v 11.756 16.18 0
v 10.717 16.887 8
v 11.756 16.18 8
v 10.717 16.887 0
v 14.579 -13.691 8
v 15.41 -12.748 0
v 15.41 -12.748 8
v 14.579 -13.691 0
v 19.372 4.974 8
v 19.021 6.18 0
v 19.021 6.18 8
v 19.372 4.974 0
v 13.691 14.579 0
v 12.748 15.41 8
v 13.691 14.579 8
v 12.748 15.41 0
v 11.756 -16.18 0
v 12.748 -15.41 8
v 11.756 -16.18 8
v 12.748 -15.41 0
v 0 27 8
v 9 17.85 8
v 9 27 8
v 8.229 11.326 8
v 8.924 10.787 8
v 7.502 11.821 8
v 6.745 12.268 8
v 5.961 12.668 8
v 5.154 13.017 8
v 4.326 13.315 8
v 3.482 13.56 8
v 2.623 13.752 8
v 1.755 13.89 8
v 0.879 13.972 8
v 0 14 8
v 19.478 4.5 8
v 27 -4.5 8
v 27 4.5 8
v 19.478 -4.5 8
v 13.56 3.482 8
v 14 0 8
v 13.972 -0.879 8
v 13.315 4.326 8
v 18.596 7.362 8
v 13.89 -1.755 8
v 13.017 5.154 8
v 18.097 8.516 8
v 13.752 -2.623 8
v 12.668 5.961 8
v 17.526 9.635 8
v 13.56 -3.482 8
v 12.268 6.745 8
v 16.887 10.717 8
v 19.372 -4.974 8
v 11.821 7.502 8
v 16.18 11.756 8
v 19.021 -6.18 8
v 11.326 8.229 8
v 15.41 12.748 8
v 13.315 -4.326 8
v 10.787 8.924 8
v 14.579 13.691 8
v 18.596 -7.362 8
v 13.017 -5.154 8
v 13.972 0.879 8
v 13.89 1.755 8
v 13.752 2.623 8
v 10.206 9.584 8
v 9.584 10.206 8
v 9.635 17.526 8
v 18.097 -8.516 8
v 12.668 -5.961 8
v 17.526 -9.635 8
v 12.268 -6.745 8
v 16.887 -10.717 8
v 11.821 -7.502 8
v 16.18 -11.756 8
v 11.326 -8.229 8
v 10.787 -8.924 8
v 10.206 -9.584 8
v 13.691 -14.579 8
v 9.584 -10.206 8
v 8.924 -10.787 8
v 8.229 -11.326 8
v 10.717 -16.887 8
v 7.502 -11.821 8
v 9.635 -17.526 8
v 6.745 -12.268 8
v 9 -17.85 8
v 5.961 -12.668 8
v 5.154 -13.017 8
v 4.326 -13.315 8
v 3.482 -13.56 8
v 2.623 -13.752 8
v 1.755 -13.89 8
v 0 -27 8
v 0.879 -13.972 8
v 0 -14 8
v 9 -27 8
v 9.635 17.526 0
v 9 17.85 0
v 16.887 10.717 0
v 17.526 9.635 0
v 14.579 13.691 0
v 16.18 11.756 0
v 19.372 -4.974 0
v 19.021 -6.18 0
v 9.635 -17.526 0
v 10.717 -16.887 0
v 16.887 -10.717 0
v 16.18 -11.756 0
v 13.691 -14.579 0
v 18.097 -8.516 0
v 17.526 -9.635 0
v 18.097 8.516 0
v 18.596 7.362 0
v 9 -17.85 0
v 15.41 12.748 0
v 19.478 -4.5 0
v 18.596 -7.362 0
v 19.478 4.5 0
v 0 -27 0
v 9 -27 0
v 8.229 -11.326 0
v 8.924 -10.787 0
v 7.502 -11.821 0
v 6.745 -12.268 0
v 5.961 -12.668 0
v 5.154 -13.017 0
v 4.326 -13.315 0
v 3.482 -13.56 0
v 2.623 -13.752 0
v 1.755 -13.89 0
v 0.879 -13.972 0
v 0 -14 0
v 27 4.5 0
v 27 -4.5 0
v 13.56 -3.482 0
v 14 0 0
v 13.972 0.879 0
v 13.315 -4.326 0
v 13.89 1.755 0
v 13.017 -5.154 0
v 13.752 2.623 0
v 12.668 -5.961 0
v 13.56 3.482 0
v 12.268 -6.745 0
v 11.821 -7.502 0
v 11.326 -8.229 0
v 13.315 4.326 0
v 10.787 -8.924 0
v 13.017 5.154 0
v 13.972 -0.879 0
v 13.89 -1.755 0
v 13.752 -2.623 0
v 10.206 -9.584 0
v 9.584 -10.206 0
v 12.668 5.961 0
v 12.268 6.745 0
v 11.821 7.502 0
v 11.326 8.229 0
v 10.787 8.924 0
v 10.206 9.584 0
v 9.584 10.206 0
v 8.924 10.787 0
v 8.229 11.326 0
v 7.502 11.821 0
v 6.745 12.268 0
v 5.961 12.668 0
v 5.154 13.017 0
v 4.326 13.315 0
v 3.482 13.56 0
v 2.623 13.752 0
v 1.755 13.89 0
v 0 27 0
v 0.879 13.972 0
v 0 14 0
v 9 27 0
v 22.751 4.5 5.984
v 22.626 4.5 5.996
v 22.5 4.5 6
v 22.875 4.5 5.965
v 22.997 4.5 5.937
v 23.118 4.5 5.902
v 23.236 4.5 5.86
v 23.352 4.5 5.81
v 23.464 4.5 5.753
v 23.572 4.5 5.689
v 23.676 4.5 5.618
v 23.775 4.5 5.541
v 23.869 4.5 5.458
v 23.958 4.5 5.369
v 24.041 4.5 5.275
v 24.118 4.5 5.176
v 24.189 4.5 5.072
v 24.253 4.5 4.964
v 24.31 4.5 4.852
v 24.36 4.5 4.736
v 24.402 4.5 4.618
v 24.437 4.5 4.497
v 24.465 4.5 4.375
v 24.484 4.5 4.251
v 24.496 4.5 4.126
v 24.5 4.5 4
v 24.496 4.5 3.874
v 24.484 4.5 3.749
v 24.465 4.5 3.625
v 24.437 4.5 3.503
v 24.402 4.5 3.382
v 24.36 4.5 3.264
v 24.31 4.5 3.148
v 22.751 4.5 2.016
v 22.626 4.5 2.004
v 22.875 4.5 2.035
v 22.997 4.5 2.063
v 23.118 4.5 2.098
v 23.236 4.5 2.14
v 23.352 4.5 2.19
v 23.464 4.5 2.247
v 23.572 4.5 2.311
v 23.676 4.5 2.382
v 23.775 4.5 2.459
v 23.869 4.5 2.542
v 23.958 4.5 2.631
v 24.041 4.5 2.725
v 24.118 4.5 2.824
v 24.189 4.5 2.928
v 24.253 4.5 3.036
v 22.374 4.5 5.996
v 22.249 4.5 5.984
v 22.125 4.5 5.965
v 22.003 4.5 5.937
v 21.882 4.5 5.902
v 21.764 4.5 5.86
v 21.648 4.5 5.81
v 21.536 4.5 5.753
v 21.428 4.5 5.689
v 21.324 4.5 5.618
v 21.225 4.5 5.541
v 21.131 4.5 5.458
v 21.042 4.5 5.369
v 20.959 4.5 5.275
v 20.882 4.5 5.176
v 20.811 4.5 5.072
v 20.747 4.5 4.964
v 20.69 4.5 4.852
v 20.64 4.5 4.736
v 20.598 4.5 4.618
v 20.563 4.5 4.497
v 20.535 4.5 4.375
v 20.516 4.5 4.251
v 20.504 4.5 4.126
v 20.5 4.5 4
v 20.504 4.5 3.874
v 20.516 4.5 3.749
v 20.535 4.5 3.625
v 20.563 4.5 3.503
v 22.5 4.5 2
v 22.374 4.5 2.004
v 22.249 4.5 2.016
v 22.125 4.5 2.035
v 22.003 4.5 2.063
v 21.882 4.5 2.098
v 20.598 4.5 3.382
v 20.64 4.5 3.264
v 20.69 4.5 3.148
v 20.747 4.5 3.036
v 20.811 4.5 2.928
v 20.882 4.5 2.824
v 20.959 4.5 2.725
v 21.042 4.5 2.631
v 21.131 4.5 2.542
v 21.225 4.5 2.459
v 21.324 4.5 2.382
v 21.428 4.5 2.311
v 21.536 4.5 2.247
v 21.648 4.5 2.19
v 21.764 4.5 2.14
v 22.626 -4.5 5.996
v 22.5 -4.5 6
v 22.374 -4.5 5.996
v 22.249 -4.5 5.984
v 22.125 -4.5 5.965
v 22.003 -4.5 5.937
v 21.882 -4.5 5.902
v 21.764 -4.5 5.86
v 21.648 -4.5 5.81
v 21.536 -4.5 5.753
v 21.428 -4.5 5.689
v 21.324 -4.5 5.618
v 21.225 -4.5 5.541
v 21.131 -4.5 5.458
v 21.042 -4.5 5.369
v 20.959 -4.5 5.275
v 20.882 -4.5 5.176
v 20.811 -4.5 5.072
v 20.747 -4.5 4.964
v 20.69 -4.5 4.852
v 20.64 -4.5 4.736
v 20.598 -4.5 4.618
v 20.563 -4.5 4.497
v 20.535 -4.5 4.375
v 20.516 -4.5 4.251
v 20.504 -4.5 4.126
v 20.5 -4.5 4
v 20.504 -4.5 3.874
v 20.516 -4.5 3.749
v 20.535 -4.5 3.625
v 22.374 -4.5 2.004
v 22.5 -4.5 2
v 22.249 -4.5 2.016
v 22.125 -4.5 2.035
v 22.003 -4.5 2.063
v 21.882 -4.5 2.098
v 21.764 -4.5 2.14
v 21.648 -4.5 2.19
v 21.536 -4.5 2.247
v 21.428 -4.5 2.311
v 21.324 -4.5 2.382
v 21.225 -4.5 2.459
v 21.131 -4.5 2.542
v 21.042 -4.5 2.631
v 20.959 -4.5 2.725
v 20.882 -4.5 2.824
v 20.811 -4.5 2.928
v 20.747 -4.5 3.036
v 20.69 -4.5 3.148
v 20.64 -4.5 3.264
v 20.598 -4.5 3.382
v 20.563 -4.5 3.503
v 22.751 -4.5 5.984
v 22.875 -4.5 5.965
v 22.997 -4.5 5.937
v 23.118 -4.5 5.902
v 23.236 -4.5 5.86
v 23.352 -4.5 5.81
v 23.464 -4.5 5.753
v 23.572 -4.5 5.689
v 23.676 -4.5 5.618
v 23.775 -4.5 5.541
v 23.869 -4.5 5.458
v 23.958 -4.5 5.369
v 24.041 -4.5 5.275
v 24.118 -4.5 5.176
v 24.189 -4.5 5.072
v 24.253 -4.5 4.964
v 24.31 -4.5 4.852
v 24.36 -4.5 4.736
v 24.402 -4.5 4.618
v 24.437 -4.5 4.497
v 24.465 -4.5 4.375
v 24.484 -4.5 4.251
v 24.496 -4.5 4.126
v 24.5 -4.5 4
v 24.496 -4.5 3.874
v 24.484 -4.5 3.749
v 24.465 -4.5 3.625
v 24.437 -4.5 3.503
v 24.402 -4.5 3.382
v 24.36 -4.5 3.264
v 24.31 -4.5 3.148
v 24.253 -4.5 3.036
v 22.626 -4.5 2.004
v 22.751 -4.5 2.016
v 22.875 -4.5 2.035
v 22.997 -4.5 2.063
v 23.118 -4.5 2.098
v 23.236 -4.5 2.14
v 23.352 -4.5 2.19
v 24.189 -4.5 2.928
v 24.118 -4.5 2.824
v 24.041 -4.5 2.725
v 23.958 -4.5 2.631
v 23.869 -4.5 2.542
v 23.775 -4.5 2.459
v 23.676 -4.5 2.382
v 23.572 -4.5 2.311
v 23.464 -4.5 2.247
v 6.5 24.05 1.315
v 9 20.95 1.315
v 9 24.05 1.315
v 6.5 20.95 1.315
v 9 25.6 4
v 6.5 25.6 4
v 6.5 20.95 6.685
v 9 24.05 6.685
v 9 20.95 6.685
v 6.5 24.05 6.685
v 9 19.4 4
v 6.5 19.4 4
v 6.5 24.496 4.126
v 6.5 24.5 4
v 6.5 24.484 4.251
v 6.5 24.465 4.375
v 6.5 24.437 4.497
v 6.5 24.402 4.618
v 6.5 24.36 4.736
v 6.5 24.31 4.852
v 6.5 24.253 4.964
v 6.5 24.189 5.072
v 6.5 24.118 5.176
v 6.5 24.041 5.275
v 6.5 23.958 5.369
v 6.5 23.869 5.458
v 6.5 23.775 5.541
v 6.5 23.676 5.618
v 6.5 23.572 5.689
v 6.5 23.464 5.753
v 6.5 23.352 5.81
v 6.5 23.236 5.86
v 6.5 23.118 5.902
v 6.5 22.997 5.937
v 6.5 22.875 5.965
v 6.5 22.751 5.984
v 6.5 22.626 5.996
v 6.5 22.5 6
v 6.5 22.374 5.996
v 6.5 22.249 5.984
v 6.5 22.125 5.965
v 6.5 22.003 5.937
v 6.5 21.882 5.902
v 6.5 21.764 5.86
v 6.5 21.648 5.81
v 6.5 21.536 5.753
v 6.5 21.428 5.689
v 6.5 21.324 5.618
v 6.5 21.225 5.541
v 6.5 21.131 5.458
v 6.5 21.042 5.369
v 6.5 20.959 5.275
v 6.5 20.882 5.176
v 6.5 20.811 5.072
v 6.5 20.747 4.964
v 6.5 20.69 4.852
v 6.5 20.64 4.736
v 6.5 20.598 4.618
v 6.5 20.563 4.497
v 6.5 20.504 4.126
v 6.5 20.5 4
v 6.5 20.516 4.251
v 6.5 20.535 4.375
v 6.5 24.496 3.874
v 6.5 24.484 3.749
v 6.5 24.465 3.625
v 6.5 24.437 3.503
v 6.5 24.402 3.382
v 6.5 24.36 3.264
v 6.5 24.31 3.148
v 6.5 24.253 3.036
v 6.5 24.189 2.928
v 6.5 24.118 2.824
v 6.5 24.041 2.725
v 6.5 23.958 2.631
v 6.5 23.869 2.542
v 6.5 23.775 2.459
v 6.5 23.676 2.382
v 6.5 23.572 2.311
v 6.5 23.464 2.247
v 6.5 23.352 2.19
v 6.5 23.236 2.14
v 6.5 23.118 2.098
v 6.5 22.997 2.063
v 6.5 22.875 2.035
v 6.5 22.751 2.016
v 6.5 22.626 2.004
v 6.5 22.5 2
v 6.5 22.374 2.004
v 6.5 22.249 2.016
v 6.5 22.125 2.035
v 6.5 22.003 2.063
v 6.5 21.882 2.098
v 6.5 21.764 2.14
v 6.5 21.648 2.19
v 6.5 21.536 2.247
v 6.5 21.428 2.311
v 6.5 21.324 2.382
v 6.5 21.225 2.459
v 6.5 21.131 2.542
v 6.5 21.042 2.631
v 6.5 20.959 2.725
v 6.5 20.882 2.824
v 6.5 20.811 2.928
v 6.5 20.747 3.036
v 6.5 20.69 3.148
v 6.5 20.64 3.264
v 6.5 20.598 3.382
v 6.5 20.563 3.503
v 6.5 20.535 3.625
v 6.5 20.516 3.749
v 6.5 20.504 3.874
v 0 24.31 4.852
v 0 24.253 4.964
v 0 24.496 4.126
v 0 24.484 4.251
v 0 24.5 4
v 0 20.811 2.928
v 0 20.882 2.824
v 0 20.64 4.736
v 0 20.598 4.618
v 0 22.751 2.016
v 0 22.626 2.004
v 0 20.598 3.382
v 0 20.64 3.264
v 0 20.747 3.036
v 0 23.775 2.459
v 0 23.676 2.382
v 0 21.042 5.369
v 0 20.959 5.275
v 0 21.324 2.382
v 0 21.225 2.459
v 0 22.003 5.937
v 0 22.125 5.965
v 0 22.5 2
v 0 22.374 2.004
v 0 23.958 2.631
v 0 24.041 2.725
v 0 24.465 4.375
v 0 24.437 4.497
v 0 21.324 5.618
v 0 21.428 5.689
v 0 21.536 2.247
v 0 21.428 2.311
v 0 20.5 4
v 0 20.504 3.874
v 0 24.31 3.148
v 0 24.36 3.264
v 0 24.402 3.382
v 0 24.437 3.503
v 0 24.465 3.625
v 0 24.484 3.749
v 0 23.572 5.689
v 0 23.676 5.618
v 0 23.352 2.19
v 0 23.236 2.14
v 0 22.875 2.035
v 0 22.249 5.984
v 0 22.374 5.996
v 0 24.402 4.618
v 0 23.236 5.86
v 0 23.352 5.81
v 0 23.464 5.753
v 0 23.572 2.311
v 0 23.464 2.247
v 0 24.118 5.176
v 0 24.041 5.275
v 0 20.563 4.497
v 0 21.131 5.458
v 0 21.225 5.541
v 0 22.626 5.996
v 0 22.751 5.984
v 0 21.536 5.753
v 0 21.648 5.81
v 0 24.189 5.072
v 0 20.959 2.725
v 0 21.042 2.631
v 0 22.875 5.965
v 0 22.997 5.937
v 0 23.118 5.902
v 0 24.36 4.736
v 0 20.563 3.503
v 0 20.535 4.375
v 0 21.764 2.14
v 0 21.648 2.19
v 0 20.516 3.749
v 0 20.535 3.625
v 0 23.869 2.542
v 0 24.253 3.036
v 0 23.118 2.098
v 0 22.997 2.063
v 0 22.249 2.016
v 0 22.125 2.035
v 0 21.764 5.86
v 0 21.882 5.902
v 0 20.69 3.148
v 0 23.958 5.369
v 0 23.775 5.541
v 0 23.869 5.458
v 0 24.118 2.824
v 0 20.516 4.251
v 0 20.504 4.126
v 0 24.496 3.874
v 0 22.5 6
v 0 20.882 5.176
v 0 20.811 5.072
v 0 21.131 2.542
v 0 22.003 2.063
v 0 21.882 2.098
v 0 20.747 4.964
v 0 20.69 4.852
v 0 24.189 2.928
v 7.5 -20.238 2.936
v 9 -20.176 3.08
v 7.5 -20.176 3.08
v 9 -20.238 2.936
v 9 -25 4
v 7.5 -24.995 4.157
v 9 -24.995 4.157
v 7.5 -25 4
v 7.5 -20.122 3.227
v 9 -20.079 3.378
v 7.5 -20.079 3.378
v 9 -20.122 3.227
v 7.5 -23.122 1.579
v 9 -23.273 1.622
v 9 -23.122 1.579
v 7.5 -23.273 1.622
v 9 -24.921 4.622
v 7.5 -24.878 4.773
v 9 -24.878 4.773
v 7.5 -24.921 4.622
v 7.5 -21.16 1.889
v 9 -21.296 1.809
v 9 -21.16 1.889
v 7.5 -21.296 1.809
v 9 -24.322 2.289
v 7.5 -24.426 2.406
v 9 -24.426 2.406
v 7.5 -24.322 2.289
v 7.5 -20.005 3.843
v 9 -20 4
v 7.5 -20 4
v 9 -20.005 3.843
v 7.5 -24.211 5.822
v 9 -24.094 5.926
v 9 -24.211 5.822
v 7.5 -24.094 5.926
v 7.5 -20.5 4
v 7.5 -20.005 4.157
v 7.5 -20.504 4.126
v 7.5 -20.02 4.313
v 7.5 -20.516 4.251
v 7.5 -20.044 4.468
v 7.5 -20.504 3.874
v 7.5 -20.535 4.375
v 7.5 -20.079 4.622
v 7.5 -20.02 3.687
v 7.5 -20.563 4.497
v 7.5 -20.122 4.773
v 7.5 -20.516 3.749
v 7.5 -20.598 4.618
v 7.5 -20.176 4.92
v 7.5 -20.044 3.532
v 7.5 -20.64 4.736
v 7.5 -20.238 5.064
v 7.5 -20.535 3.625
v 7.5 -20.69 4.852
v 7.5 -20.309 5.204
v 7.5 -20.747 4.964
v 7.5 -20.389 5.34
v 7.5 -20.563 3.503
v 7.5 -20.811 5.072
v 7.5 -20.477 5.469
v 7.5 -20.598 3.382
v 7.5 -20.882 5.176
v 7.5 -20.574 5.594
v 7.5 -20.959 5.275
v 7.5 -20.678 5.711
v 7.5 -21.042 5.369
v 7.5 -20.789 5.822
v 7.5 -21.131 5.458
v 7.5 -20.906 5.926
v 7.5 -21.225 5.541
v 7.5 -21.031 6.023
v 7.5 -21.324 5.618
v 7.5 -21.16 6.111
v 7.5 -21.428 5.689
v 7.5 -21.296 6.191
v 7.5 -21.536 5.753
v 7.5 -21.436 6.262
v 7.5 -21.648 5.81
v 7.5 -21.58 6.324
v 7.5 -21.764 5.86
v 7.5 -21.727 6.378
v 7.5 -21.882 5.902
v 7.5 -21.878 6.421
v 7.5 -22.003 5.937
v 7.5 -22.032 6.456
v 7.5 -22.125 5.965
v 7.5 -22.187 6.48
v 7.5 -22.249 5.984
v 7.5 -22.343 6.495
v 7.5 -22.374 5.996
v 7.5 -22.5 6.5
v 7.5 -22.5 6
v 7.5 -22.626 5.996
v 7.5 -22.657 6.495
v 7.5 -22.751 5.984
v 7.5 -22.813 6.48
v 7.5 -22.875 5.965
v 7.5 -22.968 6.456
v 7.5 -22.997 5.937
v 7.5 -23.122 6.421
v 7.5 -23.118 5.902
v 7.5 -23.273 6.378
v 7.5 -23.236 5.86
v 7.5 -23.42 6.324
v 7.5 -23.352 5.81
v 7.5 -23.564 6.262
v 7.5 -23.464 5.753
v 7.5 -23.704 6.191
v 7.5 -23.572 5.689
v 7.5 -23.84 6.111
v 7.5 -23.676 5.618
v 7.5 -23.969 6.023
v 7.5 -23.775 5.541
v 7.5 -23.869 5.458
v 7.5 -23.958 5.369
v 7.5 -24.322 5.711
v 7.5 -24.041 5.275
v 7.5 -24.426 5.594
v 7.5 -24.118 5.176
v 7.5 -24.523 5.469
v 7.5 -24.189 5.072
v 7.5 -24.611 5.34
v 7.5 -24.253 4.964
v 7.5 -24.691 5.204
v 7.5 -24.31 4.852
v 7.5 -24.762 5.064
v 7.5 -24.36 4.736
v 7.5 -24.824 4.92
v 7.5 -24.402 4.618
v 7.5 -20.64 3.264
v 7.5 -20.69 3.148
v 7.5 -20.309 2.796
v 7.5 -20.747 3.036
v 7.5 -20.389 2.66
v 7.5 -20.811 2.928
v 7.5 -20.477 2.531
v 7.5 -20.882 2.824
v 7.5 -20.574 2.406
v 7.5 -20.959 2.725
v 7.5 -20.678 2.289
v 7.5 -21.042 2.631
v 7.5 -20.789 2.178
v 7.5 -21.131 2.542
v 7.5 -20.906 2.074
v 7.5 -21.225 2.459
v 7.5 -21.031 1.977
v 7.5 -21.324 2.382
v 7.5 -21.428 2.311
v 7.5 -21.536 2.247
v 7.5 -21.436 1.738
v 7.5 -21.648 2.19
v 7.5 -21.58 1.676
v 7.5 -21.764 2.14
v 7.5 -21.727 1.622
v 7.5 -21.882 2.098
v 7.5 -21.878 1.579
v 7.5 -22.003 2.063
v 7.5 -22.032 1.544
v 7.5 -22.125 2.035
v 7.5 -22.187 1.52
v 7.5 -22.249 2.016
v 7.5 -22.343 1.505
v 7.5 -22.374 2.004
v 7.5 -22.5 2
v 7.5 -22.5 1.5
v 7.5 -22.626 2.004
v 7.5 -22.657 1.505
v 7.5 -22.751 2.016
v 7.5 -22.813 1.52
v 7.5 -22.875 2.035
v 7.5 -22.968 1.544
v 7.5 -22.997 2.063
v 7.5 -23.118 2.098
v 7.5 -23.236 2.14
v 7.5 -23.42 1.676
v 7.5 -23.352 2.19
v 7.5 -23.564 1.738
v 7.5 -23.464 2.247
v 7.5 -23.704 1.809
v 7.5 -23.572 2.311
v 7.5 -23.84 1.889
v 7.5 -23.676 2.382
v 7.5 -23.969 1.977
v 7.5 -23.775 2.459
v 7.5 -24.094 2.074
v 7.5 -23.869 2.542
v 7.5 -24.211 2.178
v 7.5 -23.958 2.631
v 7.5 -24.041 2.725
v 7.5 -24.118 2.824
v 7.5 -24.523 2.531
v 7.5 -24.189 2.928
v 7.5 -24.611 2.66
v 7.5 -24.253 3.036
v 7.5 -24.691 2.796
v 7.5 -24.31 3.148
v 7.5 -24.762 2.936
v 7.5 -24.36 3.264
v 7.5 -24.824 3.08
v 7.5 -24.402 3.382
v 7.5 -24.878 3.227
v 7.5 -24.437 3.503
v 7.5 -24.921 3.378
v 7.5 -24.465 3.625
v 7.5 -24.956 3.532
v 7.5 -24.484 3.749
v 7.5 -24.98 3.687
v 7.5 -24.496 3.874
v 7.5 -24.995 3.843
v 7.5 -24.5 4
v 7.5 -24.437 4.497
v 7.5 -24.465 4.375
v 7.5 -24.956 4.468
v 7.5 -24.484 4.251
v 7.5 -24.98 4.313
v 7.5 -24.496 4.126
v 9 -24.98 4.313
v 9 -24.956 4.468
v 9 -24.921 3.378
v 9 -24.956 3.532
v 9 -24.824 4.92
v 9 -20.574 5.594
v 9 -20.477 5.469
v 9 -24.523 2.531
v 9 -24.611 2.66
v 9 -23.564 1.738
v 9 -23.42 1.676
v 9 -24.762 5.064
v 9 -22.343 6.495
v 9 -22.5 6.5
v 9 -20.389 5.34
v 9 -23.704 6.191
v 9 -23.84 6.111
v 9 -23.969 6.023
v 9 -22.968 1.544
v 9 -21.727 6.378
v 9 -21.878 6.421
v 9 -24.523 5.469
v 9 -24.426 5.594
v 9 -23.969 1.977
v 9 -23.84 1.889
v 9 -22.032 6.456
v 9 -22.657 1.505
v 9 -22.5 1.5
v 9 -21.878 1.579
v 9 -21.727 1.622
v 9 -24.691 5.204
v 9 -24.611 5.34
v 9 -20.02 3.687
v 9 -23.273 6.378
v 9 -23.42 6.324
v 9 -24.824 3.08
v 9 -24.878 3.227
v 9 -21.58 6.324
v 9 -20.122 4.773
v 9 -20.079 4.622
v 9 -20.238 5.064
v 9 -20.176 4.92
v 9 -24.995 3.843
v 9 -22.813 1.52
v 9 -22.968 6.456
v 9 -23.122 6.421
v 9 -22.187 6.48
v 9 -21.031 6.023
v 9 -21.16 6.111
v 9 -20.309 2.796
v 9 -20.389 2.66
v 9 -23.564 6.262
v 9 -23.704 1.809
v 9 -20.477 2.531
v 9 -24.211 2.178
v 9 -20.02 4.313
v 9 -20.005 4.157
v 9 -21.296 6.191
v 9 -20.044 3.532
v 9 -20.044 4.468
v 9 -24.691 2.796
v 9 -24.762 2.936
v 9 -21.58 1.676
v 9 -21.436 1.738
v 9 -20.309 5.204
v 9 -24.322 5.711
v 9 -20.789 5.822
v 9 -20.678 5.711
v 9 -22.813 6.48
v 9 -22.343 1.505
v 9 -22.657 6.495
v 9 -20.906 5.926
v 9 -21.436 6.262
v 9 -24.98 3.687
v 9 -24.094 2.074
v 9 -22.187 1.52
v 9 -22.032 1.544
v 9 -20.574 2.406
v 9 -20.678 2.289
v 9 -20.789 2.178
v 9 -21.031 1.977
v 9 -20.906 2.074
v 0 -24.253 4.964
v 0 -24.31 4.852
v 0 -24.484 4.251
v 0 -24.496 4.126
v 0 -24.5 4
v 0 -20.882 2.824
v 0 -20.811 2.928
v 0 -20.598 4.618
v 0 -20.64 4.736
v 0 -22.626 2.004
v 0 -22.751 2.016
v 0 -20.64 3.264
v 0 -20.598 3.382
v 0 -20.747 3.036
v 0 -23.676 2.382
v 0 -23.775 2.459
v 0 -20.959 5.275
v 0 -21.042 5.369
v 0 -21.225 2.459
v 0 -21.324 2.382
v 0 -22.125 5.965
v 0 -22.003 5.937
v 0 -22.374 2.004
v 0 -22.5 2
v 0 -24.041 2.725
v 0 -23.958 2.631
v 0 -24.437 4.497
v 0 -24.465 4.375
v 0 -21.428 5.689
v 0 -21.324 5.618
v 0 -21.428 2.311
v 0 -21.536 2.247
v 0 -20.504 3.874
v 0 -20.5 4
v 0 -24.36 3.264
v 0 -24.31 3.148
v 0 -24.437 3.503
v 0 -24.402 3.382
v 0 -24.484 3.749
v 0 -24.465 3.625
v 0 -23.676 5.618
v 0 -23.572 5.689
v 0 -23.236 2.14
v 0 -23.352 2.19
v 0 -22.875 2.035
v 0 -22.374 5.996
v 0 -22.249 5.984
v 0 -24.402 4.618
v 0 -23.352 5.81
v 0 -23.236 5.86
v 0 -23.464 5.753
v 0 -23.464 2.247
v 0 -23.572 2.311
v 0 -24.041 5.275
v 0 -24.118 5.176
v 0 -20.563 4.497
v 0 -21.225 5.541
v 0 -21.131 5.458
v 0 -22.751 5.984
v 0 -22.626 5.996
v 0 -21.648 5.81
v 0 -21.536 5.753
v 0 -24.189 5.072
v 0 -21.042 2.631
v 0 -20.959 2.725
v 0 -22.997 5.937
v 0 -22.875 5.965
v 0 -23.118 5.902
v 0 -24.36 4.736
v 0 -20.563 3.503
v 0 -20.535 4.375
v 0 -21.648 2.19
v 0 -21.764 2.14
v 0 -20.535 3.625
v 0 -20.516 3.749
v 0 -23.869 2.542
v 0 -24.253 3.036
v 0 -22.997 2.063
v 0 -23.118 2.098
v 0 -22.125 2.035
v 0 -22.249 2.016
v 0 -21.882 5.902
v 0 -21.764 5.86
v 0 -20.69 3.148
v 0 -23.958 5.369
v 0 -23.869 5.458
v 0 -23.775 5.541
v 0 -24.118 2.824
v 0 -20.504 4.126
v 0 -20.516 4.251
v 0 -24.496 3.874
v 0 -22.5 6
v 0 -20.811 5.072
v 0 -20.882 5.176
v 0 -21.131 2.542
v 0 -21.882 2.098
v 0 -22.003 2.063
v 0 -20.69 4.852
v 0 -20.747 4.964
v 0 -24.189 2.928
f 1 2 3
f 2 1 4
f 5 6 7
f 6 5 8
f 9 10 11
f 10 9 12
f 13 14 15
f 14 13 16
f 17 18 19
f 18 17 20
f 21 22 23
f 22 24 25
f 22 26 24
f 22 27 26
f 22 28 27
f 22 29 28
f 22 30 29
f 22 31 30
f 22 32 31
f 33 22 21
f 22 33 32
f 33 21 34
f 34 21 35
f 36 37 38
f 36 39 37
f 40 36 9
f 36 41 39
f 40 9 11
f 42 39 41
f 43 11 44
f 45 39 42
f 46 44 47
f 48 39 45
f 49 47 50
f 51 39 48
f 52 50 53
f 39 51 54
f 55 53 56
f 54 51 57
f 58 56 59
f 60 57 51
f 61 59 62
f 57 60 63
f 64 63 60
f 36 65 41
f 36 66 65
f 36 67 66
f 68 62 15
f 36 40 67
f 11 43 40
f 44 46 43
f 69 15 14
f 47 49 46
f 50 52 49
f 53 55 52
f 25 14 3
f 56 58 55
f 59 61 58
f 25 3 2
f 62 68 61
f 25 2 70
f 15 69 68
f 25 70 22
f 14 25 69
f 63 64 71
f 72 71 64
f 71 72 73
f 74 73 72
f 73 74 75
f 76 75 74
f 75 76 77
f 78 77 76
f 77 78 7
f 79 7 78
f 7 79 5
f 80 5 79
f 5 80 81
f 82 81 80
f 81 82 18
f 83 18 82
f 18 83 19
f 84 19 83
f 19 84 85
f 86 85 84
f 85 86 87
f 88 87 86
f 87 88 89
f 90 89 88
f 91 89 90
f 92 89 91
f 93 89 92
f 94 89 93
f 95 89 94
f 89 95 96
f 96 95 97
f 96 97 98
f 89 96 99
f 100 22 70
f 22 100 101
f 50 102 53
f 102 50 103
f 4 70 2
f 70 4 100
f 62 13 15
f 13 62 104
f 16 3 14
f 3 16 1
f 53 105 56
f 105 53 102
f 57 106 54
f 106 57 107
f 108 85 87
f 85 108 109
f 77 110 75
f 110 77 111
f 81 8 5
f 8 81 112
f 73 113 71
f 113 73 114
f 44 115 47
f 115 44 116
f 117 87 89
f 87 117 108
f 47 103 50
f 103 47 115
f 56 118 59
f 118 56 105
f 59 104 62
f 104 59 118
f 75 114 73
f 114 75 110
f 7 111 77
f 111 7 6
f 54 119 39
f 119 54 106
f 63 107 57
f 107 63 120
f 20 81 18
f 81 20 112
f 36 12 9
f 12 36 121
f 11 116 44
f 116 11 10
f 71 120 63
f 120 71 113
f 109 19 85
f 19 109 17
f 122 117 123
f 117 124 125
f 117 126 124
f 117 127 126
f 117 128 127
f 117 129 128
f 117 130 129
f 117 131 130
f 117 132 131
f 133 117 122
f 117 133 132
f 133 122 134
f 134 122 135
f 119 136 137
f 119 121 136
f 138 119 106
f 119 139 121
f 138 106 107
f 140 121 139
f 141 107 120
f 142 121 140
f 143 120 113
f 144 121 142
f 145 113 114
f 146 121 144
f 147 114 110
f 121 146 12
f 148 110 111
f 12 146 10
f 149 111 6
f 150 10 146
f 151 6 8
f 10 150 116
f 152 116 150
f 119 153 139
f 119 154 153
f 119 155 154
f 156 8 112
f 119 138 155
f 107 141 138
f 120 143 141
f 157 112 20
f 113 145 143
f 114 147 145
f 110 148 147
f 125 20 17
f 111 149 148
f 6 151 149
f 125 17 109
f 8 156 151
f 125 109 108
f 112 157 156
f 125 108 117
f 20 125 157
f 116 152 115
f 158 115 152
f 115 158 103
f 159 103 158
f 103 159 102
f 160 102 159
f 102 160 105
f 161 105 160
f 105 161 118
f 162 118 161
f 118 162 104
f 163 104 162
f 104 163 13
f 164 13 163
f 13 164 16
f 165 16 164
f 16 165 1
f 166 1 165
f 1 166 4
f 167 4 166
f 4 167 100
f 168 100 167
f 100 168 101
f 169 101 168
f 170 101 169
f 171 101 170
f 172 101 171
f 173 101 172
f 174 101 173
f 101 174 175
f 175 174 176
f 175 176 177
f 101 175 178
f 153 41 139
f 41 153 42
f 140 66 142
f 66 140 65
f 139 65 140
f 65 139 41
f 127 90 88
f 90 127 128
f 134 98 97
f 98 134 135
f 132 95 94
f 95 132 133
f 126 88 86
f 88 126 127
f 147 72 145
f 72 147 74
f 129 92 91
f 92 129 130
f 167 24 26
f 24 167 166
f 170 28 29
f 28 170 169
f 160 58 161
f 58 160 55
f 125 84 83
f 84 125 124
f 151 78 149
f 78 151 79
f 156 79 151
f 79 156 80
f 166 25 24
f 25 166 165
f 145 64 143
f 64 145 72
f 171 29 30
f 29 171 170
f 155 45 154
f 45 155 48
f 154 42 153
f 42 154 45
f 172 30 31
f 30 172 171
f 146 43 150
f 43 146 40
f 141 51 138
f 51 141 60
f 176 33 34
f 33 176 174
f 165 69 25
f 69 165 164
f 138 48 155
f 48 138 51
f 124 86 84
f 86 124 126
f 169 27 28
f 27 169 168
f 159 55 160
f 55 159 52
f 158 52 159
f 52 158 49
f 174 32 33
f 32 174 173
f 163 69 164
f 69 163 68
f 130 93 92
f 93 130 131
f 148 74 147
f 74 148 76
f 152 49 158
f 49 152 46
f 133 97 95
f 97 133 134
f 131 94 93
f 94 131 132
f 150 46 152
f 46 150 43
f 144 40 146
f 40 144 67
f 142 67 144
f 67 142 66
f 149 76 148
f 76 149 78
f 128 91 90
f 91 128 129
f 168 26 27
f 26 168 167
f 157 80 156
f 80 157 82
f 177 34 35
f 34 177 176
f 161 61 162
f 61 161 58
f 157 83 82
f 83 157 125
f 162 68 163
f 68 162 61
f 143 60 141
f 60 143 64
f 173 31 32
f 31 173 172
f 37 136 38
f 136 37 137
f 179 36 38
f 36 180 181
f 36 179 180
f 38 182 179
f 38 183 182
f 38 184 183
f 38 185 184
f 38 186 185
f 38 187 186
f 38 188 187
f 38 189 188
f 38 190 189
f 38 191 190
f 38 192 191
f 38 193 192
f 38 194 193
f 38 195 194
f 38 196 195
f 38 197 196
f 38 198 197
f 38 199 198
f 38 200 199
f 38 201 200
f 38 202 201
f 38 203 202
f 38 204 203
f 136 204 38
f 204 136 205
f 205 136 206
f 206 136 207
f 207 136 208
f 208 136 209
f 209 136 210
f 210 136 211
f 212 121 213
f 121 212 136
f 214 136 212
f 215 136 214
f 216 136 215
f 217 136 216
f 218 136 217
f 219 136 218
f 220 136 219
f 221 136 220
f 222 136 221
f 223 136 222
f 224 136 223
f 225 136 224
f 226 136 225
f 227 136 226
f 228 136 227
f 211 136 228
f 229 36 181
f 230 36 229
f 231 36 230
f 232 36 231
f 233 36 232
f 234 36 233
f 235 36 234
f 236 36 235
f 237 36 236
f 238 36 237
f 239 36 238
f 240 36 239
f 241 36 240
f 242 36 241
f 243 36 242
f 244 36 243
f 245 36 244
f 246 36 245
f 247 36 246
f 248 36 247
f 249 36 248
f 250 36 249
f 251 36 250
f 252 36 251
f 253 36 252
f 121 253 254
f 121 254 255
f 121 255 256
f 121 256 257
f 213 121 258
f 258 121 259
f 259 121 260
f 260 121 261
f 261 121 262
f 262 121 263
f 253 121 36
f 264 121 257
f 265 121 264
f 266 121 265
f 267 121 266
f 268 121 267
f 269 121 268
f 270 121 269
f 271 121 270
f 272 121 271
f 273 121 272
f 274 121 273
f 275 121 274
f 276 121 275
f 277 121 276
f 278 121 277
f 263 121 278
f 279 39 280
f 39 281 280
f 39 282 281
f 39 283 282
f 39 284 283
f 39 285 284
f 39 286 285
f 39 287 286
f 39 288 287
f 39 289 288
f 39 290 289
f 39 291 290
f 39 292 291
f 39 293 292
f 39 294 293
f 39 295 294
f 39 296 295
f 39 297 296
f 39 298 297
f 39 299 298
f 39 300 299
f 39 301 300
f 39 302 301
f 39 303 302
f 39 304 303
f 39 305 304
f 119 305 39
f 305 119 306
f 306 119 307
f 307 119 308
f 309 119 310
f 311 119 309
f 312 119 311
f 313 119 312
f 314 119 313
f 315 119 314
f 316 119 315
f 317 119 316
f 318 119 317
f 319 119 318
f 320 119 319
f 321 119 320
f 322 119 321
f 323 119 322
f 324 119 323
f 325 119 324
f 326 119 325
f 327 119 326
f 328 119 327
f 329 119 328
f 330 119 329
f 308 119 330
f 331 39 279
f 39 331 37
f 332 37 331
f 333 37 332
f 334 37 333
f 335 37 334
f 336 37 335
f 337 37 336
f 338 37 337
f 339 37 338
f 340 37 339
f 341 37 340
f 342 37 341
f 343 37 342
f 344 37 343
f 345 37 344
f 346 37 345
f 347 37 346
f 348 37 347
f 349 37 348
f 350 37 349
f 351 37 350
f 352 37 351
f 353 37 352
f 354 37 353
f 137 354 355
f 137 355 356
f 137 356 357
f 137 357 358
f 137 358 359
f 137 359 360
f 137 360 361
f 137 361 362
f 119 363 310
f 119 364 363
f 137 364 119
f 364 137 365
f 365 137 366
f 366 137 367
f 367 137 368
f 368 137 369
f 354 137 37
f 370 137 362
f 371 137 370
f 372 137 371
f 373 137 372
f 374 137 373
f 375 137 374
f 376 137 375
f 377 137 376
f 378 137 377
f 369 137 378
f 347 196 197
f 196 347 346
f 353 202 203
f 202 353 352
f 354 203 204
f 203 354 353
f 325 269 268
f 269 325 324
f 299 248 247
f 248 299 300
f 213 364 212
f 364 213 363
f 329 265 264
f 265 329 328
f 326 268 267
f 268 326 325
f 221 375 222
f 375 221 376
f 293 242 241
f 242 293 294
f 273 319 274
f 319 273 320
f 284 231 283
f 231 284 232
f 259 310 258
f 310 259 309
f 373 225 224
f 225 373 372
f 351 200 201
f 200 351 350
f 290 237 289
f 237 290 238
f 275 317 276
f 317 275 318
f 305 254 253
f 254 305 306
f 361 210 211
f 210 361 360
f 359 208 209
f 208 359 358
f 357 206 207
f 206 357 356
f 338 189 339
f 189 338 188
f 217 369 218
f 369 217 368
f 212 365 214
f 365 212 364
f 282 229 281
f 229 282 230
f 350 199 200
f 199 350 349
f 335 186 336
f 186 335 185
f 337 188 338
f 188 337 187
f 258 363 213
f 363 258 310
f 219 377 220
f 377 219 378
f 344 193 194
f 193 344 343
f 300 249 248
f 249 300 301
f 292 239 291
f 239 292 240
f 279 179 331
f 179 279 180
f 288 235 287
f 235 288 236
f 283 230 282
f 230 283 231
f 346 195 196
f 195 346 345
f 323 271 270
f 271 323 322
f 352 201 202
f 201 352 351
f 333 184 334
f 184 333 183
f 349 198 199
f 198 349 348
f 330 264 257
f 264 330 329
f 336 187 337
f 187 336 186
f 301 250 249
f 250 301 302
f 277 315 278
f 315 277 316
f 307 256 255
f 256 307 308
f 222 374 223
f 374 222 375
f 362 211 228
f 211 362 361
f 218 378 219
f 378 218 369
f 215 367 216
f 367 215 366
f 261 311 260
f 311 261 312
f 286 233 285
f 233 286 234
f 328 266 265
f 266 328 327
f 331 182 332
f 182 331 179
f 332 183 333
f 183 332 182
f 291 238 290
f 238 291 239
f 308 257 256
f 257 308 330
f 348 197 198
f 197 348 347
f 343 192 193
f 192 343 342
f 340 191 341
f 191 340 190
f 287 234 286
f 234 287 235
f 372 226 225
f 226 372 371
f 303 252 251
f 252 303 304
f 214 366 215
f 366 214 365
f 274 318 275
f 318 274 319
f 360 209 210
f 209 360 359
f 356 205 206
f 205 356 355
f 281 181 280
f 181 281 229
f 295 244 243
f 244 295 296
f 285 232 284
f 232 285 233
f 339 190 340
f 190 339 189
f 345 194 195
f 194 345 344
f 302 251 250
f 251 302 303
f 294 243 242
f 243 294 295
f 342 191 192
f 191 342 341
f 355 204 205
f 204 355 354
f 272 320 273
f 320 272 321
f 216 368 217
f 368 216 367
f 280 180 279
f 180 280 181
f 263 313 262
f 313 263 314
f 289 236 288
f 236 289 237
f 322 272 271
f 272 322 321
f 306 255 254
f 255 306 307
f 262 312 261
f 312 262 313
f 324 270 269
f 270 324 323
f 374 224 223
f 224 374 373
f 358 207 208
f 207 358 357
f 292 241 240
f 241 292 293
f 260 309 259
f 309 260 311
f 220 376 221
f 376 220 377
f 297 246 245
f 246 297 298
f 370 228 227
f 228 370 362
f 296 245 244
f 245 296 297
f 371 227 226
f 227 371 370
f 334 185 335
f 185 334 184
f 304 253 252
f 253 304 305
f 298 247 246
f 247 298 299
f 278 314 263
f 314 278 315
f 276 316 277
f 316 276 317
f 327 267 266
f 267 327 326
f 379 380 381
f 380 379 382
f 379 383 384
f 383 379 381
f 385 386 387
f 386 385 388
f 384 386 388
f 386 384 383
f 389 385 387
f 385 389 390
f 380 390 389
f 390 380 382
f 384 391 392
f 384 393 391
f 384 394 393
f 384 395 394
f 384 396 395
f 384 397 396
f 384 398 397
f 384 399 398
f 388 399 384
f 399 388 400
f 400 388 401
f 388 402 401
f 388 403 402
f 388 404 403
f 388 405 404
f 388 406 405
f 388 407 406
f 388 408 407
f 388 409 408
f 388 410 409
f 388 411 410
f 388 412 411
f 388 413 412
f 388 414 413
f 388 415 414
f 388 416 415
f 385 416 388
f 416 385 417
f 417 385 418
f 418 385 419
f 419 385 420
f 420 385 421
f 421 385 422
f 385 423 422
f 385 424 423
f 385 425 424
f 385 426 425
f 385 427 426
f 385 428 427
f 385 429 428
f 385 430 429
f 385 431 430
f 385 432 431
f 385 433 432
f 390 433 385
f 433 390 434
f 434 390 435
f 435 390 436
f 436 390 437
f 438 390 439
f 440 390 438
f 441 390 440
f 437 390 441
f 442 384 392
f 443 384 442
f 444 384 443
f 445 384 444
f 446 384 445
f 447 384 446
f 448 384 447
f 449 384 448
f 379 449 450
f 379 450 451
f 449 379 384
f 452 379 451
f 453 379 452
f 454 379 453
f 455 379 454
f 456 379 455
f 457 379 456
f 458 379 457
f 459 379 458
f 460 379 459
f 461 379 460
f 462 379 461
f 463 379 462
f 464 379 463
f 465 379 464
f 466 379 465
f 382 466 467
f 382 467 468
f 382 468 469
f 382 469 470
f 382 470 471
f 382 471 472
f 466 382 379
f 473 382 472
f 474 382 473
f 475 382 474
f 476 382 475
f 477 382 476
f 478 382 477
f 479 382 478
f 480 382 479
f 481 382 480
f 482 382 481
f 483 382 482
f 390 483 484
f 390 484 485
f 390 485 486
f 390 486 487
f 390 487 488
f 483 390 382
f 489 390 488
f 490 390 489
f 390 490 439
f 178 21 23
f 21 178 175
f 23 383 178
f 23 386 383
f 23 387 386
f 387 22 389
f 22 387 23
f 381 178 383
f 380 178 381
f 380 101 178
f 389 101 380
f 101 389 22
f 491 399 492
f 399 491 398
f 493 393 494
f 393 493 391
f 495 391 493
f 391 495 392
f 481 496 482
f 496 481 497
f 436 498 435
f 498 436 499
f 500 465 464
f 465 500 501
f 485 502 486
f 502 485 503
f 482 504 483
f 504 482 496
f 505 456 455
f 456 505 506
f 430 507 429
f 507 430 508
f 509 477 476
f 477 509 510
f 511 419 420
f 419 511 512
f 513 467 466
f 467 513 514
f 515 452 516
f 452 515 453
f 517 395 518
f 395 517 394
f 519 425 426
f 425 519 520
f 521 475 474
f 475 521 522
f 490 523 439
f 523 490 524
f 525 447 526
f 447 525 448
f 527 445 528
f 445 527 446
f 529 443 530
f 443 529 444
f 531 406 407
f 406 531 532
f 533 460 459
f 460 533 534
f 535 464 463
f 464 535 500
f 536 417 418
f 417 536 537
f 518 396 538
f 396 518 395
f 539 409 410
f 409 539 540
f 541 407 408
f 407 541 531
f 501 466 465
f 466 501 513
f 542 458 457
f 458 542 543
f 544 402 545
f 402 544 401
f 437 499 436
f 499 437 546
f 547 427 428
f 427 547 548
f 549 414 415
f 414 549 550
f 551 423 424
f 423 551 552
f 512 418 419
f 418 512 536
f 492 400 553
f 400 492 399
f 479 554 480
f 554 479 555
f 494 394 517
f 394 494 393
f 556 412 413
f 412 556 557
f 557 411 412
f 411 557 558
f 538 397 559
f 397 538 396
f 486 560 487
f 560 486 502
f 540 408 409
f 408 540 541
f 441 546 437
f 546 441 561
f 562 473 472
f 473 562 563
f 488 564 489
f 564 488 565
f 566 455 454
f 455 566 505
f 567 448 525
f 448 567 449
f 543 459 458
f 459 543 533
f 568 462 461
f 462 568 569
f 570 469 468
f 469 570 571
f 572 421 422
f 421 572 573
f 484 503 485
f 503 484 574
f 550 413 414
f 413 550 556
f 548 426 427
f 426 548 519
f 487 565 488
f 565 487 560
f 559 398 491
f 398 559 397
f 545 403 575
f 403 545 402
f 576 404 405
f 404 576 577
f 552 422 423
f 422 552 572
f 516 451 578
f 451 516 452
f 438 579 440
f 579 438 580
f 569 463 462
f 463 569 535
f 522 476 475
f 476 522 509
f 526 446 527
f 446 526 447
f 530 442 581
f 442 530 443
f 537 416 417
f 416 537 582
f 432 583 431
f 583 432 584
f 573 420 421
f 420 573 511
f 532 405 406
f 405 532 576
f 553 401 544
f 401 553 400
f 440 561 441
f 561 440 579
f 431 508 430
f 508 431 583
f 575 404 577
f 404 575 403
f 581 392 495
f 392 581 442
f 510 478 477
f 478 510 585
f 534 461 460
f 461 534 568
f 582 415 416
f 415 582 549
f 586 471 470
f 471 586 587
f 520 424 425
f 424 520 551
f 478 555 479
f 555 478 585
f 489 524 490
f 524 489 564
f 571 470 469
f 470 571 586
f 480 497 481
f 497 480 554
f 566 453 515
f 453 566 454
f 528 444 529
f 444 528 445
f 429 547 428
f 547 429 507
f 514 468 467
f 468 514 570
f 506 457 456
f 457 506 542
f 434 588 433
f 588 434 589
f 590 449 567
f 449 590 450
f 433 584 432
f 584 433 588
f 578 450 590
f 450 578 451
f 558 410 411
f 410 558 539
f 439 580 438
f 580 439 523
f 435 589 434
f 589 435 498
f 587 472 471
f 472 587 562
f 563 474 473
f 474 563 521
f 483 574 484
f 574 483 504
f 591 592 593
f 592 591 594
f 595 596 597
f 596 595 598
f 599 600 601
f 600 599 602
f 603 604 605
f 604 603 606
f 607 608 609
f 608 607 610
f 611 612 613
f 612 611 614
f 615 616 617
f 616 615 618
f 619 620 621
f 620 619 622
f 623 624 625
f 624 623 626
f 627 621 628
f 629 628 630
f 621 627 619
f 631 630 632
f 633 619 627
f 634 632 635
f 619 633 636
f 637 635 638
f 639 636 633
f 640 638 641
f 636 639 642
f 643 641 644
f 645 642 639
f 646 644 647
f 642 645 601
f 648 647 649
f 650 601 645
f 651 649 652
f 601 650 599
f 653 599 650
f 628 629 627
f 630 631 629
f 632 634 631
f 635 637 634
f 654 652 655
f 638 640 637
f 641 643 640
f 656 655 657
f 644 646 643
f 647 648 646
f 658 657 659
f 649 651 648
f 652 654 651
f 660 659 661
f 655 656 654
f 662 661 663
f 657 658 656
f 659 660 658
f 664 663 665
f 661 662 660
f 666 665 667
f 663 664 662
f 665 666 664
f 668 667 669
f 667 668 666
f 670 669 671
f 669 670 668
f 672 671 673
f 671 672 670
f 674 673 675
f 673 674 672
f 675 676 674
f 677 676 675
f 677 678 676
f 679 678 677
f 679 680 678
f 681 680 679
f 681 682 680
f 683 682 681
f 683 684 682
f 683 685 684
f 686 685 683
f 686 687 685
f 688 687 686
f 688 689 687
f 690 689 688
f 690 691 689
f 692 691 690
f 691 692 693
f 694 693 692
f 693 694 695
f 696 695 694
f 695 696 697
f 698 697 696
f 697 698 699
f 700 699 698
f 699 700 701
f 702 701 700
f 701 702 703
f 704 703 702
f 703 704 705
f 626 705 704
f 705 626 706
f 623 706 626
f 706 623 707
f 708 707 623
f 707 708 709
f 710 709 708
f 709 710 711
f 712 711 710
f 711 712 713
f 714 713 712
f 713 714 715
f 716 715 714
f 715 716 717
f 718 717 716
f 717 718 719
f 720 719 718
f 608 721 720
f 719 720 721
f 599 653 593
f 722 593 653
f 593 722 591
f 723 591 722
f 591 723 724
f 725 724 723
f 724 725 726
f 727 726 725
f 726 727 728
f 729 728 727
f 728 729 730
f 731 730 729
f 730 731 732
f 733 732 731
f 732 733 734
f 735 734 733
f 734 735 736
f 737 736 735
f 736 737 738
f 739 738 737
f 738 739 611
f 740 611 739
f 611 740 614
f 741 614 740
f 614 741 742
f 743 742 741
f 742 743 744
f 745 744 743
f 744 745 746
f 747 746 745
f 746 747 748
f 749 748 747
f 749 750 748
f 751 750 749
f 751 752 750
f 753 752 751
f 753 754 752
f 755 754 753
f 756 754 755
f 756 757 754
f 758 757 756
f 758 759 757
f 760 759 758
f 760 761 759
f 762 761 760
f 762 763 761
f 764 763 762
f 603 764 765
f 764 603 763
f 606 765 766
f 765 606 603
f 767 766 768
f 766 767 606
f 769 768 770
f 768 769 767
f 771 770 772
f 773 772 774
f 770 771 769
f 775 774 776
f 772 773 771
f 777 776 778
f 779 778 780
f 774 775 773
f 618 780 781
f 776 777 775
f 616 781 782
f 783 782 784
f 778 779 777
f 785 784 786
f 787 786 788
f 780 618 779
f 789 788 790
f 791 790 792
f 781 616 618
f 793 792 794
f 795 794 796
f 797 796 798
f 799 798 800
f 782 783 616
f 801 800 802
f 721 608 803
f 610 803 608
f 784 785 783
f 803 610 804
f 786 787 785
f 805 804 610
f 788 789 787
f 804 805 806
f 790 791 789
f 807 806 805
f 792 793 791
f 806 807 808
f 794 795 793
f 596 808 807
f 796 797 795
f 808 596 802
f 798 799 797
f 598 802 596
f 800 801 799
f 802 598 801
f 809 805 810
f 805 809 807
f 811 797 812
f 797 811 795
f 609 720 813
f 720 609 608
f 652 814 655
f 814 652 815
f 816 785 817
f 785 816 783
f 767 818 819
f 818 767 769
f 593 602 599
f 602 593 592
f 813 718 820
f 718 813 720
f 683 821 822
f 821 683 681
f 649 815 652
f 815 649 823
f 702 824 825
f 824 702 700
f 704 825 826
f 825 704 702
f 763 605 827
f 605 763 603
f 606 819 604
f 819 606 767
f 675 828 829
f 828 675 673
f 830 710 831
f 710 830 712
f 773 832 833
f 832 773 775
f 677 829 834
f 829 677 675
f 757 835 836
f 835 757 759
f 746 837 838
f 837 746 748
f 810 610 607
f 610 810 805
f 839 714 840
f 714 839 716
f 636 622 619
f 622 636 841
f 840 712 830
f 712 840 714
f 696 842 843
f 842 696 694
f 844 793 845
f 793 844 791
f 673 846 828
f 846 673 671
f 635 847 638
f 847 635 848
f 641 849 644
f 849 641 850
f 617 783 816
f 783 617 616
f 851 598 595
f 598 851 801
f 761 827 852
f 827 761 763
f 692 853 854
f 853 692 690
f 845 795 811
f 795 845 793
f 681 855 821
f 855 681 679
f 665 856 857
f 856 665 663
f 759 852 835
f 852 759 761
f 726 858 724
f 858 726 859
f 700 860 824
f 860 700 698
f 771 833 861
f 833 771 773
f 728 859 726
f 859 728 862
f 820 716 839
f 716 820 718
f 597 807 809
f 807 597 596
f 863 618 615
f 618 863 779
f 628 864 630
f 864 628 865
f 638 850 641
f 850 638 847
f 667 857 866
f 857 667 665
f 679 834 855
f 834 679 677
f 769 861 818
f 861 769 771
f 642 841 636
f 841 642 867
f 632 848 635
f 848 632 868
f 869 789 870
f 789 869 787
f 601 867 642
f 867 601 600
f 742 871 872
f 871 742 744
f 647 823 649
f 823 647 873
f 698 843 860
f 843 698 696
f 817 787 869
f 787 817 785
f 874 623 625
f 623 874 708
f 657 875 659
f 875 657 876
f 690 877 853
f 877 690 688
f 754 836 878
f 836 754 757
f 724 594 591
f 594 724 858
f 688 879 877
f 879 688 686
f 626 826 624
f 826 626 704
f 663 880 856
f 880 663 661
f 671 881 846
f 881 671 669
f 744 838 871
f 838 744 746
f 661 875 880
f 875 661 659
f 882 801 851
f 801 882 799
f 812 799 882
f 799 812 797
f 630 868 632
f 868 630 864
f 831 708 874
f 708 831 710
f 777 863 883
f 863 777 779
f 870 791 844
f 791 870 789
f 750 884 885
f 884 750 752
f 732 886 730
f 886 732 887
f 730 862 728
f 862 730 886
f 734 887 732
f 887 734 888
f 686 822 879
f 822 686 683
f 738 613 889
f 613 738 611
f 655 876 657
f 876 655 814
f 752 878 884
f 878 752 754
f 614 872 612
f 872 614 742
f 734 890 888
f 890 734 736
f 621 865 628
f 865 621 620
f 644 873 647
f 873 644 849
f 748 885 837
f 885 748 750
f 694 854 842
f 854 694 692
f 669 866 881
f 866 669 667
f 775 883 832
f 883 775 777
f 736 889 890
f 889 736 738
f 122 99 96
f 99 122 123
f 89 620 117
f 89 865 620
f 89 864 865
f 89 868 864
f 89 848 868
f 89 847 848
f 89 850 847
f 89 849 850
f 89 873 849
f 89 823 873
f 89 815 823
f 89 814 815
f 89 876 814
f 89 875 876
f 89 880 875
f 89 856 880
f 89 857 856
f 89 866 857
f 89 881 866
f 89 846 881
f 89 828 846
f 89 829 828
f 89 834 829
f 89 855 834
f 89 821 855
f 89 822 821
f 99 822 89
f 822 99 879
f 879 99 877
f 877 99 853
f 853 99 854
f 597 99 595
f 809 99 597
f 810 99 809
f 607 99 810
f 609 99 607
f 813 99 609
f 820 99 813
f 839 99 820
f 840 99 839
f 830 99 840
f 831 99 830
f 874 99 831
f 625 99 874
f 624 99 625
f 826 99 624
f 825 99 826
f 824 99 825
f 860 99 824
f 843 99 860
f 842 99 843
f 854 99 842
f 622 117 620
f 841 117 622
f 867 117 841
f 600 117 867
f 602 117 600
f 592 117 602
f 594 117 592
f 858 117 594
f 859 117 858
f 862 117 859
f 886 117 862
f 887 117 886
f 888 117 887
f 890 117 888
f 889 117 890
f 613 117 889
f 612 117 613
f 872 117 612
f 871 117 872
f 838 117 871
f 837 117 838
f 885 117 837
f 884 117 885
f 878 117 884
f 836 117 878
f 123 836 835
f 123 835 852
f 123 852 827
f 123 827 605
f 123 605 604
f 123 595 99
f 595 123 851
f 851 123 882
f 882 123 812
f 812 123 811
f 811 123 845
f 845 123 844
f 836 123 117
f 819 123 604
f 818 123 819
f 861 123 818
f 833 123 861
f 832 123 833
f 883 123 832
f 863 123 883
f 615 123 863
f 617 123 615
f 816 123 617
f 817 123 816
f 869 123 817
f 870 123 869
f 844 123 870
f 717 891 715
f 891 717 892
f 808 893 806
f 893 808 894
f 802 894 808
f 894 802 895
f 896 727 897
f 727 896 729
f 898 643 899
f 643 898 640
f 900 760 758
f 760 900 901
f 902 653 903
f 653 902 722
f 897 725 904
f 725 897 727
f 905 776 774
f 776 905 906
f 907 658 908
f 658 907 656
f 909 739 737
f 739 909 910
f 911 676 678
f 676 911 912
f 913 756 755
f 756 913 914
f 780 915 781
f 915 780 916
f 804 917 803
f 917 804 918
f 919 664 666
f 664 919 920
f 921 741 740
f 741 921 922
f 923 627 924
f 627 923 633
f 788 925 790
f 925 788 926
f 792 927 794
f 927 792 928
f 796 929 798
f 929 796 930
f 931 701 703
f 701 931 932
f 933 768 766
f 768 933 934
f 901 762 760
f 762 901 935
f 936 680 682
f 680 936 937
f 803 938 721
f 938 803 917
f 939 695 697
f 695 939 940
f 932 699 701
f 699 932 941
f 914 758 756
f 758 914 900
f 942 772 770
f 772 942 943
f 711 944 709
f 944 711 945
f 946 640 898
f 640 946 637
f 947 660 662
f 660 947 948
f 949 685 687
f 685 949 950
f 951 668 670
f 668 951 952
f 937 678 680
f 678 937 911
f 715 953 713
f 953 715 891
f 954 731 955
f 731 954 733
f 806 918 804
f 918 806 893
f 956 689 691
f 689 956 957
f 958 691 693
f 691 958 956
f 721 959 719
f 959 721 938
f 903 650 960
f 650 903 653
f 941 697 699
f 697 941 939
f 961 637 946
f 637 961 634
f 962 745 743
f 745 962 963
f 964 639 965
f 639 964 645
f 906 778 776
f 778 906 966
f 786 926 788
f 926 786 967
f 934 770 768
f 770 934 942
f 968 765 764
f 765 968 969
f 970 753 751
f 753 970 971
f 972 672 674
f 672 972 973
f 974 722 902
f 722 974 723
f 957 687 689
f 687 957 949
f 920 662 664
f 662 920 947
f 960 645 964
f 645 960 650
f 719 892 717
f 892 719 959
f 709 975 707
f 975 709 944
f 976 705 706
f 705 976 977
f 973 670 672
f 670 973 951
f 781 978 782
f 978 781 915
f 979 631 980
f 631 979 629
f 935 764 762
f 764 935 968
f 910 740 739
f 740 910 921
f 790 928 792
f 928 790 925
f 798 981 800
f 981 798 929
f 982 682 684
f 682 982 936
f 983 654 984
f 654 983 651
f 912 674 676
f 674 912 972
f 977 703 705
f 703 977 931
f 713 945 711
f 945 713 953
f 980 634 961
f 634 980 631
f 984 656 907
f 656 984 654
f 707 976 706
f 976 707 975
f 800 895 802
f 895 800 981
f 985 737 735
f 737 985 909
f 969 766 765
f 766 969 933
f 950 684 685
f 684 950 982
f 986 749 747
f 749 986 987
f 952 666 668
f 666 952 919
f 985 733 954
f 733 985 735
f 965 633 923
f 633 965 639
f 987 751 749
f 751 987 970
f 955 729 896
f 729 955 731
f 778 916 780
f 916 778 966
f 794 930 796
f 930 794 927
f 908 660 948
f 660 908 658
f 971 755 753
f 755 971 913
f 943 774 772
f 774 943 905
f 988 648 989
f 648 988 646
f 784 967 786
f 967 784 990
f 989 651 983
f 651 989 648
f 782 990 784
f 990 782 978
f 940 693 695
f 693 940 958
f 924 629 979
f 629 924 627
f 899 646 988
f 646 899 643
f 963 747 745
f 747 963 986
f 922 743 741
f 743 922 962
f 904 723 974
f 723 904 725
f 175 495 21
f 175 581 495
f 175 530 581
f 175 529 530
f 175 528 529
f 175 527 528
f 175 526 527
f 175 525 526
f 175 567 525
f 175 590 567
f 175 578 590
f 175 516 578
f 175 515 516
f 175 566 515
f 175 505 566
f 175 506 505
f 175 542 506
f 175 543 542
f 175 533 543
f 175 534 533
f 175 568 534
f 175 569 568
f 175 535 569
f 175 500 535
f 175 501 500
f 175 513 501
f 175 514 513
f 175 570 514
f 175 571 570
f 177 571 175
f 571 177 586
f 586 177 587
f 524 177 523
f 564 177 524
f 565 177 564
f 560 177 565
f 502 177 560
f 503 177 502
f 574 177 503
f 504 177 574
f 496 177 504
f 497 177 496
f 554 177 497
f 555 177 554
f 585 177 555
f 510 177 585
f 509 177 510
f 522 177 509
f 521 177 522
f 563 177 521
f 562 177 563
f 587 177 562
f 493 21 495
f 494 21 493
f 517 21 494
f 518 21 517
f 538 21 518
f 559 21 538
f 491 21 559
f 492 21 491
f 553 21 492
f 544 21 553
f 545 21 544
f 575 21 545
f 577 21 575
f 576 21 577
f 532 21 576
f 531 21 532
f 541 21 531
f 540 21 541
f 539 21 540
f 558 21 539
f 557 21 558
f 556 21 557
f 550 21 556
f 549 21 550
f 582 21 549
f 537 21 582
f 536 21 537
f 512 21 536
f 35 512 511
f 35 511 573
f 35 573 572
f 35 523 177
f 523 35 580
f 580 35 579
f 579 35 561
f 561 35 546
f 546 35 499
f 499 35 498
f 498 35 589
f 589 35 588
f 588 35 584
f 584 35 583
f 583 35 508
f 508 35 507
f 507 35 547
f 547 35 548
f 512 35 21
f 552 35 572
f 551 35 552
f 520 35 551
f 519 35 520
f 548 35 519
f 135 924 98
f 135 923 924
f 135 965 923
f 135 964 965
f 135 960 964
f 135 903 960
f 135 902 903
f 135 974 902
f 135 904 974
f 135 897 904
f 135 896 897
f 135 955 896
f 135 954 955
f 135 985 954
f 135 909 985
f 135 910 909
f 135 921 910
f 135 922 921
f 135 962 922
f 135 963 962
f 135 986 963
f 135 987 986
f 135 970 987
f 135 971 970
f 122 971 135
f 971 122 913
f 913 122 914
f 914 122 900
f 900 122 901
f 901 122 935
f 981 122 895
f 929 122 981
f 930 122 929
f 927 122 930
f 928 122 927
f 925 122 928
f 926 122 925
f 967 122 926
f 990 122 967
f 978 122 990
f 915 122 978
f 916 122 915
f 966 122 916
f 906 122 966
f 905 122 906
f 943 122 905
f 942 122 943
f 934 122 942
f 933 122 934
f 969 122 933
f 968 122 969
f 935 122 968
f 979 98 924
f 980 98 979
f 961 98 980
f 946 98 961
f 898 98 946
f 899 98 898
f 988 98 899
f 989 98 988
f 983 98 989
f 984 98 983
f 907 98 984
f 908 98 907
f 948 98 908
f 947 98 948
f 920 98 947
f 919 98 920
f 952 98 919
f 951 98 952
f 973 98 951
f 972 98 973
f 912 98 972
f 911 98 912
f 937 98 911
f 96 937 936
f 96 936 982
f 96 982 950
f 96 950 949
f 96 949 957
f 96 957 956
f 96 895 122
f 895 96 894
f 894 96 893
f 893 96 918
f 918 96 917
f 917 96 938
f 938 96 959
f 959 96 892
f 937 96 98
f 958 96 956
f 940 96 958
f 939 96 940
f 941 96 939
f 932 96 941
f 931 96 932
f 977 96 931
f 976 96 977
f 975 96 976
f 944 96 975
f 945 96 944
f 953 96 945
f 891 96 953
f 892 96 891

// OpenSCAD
SHAFT_DIAMETER = 28;
RING_WIDTH = 6;
RING_HEIGHT = 8;



module attachment(length, traps) {
    translate([SHAFT_DIAMETER/2 + RING_WIDTH + 2, 0, RING_HEIGHT/2]) {
        difference() {
            cube([10, length, RING_HEIGHT], center=true);
            translate([0.5, length/2 + 0.5, 0]) {
                rotate([90, 0, 0]) {
                    cylinder(length + 1, 2, 2, $fn = 100);
                }
            }

            if (traps) {
                translate([0.5, length/2 + 0.5, 0]) {
                    rotate([90, 0, 0]) {
                        cylinder(2, 2.5, 2.5, $fn = 100);
                    }
                } 
                translate([0.5, -(length/2 + 0.5) + 3, 0]) {
                    rotate([90, 0, 0]) {
                        cylinder(4, 3.1, 3.1, $fn = 6);
                    }
                } 
            }
        }
    }
}

module ring() {
    difference() {
        cylinder(RING_HEIGHT, SHAFT_DIAMETER/2 + RING_WIDTH, SHAFT_DIAMETER/2 + RING_WIDTH, $fn = 100);
        translate([0,0, -0.5]) {
            cylinder(RING_HEIGHT + 1, SHAFT_DIAMETER/2, SHAFT_DIAMETER/2, $fn = 100);
        }
    }

    attachment(9, false);
    rotate([0, 0, 90]) {
        attachment(18, true);
    }
    rotate([0, 0, -90]) {
        attachment(18, true);
    }
}

if (1) {
    difference() {
        ring();
        translate([-SHAFT_DIAMETER, -SHAFT_DIAMETER, -1]) {
            cube([SHAFT_DIAMETER, SHAFT_DIAMETER*2, SHAFT_DIAMETER]);
        }
    }
}

if (0) {
    difference() {
        ring();
        translate([0, -SHAFT_DIAMETER, -1]) {
            cube([SHAFT_DIAMETER, SHAFT_DIAMETER*2, SHAFT_DIAMETER]);
        }
    }
}
